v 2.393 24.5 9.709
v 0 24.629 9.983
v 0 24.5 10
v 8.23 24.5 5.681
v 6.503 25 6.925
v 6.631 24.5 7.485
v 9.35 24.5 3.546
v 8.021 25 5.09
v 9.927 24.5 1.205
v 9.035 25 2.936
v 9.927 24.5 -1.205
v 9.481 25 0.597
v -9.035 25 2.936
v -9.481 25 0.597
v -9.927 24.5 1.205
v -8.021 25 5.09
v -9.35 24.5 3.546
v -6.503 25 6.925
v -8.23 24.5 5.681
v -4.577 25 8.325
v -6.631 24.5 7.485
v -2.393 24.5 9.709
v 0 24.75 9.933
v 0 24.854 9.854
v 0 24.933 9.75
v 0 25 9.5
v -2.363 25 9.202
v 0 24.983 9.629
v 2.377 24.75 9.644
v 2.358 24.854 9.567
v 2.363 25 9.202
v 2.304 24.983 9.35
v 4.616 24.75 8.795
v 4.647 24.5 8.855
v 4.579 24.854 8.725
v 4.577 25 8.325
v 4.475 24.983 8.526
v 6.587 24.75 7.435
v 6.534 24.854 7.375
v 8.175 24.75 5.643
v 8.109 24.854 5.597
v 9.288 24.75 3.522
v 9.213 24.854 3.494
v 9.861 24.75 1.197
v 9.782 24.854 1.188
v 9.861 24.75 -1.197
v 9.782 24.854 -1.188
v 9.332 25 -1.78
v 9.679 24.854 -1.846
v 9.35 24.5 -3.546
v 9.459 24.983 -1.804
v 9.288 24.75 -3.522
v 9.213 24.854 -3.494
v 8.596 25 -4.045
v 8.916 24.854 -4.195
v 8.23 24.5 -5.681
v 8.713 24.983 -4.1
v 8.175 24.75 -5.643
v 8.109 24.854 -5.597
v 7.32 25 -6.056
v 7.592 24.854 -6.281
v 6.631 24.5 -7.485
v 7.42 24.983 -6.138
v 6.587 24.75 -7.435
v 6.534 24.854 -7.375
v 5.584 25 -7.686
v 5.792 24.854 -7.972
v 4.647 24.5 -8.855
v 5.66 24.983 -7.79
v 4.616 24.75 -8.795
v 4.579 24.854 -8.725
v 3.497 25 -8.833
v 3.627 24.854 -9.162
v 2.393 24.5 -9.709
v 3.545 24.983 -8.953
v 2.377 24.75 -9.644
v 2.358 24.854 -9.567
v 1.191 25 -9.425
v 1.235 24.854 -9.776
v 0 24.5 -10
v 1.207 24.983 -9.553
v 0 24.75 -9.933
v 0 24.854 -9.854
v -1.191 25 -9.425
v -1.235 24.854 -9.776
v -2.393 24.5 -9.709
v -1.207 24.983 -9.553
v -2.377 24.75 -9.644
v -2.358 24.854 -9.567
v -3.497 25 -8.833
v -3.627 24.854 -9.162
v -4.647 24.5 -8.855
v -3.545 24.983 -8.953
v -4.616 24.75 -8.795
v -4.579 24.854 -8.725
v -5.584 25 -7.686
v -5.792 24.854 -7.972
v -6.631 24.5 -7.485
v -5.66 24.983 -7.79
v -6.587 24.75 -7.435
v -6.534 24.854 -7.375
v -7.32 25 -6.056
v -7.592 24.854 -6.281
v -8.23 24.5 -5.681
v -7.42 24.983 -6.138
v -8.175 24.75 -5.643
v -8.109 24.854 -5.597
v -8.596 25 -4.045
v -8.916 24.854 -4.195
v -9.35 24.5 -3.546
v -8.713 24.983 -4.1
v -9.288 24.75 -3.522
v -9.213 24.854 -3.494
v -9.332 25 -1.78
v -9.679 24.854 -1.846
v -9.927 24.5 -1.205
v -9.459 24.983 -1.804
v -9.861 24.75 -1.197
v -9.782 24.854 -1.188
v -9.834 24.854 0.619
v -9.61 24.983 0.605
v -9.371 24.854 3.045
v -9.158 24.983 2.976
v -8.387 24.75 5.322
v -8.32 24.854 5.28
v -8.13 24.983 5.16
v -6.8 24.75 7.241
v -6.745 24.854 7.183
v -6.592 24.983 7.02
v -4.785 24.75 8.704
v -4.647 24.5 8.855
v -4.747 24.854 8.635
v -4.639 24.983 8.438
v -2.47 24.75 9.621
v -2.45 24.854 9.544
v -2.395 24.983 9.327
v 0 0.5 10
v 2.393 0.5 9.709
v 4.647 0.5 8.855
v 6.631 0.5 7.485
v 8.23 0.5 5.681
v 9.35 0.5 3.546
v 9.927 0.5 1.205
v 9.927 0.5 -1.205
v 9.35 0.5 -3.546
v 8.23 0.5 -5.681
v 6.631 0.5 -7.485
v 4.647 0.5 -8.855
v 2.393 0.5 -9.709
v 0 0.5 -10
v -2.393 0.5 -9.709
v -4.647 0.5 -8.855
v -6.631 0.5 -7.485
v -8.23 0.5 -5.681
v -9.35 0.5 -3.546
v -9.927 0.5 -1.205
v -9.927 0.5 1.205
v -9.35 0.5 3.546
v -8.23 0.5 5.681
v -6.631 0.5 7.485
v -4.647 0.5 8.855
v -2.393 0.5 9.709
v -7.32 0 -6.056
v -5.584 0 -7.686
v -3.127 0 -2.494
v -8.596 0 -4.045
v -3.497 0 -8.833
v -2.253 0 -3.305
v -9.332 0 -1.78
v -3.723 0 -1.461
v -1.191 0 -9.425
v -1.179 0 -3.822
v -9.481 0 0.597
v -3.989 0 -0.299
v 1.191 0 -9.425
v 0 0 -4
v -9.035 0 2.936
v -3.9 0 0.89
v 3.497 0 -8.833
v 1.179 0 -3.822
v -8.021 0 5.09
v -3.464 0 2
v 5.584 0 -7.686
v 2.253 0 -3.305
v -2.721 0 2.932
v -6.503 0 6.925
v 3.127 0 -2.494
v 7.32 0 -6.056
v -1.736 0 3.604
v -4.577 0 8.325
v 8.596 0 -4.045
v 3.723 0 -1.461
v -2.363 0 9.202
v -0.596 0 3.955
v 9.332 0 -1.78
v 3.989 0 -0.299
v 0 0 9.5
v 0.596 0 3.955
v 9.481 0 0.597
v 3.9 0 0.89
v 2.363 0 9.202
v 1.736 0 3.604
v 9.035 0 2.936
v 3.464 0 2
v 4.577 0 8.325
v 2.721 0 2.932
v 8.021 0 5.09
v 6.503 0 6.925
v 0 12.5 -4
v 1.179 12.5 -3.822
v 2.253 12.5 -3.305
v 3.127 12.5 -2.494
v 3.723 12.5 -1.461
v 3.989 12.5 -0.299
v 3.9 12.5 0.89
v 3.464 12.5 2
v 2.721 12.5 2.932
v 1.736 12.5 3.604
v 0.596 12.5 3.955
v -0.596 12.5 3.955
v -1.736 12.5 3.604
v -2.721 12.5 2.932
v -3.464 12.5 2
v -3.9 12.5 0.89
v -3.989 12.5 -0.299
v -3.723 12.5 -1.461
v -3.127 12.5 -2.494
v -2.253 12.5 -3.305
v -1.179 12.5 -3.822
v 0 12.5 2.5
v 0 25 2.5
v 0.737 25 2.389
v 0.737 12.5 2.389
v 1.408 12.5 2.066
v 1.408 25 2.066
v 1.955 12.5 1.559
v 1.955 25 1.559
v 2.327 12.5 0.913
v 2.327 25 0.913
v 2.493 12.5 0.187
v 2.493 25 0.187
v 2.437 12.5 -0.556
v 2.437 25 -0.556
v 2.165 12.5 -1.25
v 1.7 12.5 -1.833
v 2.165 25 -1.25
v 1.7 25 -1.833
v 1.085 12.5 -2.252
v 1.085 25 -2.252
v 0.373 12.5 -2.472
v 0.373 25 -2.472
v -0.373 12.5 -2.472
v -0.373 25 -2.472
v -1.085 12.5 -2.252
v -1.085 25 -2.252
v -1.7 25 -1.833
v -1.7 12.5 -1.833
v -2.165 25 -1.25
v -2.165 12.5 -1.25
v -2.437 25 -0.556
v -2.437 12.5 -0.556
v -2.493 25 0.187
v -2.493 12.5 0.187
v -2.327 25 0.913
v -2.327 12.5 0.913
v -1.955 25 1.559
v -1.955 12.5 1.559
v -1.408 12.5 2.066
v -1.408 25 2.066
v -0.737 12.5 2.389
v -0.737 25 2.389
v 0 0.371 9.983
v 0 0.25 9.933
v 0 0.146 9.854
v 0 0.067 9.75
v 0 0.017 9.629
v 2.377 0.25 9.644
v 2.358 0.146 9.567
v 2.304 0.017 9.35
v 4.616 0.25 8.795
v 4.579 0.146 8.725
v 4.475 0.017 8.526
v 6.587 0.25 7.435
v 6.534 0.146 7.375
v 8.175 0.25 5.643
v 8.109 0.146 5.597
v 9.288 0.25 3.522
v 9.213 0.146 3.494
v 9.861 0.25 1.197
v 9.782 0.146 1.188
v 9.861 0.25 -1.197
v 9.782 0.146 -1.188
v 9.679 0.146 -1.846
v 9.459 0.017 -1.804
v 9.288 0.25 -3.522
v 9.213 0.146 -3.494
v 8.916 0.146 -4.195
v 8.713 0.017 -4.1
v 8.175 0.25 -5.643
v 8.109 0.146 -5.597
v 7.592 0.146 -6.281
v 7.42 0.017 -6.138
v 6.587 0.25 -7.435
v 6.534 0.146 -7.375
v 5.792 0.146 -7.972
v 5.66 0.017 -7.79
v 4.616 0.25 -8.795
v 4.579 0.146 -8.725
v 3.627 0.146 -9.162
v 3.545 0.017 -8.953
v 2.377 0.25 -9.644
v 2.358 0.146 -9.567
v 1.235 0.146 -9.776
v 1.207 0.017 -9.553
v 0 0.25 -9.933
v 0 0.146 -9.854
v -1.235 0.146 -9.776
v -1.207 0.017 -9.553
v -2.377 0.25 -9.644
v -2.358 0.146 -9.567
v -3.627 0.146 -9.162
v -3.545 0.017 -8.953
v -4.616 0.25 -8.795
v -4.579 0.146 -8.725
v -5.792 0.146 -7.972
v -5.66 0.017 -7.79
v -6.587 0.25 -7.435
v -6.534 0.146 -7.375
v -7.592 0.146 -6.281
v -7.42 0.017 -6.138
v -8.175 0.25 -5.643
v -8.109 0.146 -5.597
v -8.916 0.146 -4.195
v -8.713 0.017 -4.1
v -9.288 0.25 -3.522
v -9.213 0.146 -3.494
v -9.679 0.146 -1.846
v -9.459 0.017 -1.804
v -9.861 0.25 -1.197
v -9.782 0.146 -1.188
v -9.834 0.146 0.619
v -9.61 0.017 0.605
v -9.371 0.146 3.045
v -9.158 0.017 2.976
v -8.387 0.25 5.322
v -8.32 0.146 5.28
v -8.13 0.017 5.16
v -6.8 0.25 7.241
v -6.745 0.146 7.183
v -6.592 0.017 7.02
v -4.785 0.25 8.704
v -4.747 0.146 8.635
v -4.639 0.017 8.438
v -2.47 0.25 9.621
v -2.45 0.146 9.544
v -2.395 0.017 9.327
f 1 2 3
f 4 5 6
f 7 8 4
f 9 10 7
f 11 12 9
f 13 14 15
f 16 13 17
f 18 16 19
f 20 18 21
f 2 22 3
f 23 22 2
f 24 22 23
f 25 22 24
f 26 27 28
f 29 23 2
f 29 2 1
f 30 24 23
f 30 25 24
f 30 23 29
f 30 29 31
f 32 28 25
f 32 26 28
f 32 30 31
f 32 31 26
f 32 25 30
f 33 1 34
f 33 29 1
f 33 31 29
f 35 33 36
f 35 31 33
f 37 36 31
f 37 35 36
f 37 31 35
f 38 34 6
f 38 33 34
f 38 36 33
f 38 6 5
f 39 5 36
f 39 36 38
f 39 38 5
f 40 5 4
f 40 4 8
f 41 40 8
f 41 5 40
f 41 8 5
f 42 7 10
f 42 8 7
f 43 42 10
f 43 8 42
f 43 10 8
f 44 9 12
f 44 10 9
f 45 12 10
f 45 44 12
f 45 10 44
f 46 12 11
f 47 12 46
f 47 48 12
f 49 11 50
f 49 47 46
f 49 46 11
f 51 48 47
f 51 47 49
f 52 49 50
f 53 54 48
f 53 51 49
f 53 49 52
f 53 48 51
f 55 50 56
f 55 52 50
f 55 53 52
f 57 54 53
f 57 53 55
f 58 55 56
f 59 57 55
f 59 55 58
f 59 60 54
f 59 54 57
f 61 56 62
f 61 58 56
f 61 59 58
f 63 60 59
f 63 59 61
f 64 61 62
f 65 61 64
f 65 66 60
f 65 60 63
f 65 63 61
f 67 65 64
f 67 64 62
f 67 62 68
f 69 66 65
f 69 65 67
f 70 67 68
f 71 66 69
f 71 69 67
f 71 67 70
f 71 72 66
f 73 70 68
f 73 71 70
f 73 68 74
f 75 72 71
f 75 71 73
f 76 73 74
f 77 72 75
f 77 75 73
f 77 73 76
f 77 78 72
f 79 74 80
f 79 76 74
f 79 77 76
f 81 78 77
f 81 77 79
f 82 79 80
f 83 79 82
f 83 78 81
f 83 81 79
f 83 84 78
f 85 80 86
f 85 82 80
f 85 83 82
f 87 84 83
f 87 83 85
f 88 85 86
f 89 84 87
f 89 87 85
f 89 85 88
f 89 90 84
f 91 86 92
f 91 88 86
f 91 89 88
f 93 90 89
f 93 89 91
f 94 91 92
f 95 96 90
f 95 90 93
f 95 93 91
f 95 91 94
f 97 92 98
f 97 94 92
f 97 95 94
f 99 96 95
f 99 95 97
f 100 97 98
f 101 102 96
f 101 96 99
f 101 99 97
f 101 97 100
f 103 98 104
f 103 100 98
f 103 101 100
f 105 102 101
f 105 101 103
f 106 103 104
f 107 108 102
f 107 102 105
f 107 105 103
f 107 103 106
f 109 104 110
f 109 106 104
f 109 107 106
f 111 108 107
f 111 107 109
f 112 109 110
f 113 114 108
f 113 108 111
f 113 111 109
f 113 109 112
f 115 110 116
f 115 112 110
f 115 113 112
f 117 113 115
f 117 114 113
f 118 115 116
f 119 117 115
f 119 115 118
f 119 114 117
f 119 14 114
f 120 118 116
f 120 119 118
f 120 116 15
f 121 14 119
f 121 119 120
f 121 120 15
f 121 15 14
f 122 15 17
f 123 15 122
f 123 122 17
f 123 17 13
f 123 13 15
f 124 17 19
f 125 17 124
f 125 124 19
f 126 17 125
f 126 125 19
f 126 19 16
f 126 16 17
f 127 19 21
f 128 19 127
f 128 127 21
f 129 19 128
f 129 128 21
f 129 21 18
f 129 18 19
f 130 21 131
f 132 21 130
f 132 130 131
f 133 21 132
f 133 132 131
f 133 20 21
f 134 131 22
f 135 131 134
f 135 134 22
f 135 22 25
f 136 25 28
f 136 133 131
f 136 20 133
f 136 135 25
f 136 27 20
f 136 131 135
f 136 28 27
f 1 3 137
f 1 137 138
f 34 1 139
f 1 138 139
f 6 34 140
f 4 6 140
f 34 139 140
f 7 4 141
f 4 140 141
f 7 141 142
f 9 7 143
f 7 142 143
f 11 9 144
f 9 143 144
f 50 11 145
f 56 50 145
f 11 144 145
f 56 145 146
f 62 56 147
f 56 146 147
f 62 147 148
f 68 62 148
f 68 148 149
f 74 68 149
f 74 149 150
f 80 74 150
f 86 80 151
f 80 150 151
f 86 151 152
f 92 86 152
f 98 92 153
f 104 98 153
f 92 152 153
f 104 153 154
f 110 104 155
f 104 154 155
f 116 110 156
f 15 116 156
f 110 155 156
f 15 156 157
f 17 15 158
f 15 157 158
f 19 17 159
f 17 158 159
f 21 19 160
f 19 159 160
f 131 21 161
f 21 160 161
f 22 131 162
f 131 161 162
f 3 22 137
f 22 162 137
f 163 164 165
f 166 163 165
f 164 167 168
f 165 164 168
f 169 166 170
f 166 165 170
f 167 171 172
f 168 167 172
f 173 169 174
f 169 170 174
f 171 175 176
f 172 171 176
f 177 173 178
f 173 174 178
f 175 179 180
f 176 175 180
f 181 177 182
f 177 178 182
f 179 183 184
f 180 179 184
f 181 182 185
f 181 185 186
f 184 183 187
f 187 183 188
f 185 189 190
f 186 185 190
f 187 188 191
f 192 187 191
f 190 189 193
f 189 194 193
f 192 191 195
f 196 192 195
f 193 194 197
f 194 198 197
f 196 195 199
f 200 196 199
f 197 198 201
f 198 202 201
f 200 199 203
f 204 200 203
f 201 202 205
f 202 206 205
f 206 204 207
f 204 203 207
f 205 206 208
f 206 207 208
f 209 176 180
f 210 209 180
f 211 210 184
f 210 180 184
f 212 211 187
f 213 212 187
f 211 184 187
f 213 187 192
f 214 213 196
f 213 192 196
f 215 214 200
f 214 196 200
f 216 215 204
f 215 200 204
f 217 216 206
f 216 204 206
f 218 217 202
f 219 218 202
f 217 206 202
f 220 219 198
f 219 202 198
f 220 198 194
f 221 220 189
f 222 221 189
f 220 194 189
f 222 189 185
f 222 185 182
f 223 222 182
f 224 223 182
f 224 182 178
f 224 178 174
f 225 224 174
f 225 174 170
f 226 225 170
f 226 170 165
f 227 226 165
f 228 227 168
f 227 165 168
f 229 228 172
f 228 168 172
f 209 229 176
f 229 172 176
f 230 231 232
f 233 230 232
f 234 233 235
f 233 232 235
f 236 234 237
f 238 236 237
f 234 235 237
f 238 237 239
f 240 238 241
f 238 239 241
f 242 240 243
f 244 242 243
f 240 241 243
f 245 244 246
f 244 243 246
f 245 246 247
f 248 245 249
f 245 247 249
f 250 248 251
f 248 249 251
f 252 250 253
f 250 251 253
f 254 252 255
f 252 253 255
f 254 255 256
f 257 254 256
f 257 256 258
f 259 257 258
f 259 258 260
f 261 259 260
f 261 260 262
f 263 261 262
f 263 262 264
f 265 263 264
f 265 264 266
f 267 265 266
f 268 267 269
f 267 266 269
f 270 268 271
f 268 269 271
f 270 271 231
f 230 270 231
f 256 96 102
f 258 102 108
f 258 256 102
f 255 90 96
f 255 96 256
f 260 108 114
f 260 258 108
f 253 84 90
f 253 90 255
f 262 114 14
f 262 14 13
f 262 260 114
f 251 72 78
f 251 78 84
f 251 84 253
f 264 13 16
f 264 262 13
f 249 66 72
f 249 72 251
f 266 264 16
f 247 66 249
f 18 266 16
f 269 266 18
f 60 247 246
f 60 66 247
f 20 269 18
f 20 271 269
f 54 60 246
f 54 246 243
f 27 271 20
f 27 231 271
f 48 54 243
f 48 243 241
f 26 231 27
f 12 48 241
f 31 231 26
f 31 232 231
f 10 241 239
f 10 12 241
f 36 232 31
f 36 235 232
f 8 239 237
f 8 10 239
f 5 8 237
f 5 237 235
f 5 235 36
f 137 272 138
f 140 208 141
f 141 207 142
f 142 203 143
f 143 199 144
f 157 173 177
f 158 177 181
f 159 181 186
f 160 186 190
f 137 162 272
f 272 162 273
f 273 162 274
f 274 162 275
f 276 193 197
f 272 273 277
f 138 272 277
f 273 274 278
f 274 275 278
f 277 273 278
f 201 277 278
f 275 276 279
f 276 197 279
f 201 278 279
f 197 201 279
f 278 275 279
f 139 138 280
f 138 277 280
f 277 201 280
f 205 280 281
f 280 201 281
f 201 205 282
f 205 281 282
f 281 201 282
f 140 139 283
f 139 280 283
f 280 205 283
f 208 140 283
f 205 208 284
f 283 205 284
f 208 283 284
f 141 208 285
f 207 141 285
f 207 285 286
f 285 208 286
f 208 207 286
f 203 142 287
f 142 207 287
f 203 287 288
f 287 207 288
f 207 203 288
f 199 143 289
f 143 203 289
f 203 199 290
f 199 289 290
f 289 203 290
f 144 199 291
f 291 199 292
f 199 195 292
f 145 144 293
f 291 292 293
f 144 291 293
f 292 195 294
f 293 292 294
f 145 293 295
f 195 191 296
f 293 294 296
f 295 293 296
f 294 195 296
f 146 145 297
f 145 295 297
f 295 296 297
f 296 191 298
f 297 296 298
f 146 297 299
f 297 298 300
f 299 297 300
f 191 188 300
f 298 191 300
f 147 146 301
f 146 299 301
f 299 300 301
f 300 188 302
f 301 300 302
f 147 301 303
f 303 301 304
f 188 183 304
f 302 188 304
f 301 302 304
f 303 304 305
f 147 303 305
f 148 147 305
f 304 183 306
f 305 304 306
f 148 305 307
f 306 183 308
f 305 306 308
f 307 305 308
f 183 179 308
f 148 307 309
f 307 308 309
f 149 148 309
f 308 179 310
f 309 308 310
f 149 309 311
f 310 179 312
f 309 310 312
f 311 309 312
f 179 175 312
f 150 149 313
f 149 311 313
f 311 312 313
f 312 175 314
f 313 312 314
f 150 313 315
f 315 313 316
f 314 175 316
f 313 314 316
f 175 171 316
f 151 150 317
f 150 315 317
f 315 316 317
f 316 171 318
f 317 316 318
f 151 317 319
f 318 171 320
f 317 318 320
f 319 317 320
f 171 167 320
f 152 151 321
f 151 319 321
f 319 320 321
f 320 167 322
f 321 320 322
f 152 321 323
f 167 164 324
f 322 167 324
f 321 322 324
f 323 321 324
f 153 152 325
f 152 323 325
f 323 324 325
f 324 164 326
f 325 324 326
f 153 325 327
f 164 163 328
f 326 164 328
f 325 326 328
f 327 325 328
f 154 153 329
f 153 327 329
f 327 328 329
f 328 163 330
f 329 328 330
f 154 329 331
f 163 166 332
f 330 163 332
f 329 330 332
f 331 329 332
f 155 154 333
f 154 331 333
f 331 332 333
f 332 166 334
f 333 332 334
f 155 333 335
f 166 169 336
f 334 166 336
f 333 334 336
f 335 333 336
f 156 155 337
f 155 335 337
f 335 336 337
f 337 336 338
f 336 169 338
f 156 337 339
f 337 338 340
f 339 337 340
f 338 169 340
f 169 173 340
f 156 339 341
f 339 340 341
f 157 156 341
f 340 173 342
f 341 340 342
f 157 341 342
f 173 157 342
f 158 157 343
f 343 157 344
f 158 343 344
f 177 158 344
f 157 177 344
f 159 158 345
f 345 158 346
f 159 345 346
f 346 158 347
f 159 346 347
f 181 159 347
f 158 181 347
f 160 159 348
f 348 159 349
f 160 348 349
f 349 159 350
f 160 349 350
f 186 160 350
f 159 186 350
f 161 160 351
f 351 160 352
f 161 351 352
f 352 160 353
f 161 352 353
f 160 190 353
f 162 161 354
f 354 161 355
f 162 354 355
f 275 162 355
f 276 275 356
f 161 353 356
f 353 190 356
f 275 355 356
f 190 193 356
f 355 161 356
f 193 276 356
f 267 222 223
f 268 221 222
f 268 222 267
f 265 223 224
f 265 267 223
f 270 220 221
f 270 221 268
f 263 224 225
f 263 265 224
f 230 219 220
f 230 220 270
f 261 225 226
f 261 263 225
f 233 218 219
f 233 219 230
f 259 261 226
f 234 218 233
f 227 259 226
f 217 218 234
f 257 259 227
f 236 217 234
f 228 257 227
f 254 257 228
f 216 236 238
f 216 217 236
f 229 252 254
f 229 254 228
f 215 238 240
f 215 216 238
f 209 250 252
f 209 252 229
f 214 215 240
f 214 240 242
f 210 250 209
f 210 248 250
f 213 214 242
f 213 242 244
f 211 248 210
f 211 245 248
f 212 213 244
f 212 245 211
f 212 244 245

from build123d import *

# Parameters (mm, degrees)
SKETCH1_R           = 10
BOSS_EXTRUDE1_DEPTH = 25
FILLET2_R           = 0.5
FILLET3_R           = 0.5
SKETCH2_R           = 4
CUT_EXTRUDE1_DEPTH  = 12.5
SKETCH3_R           = 2.5
CUT_EXTRUDE2_DEPTH  = 12.5


with BuildPart() as part:
    # Sketch1 → Boss-Extrude1 (new body)
    with BuildSketch(Plane(origin=(0, 0, 0), x_dir=(1, 0, 0), z_dir=(0, 1, 0))):
        with Locations(Location((0, 0, 0), (0, 0, 270))):
            Circle(SKETCH1_R)
    extrude(amount=BOSS_EXTRUDE1_DEPTH)

    # Fillet2
    fillet2_edges = [part.edges().sort_by_distance(p)[0] for p in [
        (0, 25, -10),
    ]]
    fillet(fillet2_edges, radius=FILLET2_R)

    # Fillet3
    fillet3_edges = [part.edges().sort_by_distance(p)[0] for p in [
        (0, 0, -10),
    ]]
    fillet(fillet3_edges, radius=FILLET3_R)

    # Sketch2 → Cut-Extrude1 (cut)
    with BuildSketch(Plane.XZ):
        with Locations(Location((0, 0, 0), (0, 0, 270))):
            Circle(SKETCH2_R)
    extrude(amount=-CUT_EXTRUDE1_DEPTH, mode=Mode.SUBTRACT)

    # Sketch3 → Cut-Extrude2 (cut)
    with BuildSketch(Plane(origin=(0, 25, 0), x_dir=(1, 0, 0), z_dir=(0, 1, 0))):
        with Locations(Location((0, 0, 0), (0, 0, 270))):
            Circle(SKETCH3_R)
    extrude(amount=-CUT_EXTRUDE2_DEPTH, mode=Mode.SUBTRACT)


solid = part.part
